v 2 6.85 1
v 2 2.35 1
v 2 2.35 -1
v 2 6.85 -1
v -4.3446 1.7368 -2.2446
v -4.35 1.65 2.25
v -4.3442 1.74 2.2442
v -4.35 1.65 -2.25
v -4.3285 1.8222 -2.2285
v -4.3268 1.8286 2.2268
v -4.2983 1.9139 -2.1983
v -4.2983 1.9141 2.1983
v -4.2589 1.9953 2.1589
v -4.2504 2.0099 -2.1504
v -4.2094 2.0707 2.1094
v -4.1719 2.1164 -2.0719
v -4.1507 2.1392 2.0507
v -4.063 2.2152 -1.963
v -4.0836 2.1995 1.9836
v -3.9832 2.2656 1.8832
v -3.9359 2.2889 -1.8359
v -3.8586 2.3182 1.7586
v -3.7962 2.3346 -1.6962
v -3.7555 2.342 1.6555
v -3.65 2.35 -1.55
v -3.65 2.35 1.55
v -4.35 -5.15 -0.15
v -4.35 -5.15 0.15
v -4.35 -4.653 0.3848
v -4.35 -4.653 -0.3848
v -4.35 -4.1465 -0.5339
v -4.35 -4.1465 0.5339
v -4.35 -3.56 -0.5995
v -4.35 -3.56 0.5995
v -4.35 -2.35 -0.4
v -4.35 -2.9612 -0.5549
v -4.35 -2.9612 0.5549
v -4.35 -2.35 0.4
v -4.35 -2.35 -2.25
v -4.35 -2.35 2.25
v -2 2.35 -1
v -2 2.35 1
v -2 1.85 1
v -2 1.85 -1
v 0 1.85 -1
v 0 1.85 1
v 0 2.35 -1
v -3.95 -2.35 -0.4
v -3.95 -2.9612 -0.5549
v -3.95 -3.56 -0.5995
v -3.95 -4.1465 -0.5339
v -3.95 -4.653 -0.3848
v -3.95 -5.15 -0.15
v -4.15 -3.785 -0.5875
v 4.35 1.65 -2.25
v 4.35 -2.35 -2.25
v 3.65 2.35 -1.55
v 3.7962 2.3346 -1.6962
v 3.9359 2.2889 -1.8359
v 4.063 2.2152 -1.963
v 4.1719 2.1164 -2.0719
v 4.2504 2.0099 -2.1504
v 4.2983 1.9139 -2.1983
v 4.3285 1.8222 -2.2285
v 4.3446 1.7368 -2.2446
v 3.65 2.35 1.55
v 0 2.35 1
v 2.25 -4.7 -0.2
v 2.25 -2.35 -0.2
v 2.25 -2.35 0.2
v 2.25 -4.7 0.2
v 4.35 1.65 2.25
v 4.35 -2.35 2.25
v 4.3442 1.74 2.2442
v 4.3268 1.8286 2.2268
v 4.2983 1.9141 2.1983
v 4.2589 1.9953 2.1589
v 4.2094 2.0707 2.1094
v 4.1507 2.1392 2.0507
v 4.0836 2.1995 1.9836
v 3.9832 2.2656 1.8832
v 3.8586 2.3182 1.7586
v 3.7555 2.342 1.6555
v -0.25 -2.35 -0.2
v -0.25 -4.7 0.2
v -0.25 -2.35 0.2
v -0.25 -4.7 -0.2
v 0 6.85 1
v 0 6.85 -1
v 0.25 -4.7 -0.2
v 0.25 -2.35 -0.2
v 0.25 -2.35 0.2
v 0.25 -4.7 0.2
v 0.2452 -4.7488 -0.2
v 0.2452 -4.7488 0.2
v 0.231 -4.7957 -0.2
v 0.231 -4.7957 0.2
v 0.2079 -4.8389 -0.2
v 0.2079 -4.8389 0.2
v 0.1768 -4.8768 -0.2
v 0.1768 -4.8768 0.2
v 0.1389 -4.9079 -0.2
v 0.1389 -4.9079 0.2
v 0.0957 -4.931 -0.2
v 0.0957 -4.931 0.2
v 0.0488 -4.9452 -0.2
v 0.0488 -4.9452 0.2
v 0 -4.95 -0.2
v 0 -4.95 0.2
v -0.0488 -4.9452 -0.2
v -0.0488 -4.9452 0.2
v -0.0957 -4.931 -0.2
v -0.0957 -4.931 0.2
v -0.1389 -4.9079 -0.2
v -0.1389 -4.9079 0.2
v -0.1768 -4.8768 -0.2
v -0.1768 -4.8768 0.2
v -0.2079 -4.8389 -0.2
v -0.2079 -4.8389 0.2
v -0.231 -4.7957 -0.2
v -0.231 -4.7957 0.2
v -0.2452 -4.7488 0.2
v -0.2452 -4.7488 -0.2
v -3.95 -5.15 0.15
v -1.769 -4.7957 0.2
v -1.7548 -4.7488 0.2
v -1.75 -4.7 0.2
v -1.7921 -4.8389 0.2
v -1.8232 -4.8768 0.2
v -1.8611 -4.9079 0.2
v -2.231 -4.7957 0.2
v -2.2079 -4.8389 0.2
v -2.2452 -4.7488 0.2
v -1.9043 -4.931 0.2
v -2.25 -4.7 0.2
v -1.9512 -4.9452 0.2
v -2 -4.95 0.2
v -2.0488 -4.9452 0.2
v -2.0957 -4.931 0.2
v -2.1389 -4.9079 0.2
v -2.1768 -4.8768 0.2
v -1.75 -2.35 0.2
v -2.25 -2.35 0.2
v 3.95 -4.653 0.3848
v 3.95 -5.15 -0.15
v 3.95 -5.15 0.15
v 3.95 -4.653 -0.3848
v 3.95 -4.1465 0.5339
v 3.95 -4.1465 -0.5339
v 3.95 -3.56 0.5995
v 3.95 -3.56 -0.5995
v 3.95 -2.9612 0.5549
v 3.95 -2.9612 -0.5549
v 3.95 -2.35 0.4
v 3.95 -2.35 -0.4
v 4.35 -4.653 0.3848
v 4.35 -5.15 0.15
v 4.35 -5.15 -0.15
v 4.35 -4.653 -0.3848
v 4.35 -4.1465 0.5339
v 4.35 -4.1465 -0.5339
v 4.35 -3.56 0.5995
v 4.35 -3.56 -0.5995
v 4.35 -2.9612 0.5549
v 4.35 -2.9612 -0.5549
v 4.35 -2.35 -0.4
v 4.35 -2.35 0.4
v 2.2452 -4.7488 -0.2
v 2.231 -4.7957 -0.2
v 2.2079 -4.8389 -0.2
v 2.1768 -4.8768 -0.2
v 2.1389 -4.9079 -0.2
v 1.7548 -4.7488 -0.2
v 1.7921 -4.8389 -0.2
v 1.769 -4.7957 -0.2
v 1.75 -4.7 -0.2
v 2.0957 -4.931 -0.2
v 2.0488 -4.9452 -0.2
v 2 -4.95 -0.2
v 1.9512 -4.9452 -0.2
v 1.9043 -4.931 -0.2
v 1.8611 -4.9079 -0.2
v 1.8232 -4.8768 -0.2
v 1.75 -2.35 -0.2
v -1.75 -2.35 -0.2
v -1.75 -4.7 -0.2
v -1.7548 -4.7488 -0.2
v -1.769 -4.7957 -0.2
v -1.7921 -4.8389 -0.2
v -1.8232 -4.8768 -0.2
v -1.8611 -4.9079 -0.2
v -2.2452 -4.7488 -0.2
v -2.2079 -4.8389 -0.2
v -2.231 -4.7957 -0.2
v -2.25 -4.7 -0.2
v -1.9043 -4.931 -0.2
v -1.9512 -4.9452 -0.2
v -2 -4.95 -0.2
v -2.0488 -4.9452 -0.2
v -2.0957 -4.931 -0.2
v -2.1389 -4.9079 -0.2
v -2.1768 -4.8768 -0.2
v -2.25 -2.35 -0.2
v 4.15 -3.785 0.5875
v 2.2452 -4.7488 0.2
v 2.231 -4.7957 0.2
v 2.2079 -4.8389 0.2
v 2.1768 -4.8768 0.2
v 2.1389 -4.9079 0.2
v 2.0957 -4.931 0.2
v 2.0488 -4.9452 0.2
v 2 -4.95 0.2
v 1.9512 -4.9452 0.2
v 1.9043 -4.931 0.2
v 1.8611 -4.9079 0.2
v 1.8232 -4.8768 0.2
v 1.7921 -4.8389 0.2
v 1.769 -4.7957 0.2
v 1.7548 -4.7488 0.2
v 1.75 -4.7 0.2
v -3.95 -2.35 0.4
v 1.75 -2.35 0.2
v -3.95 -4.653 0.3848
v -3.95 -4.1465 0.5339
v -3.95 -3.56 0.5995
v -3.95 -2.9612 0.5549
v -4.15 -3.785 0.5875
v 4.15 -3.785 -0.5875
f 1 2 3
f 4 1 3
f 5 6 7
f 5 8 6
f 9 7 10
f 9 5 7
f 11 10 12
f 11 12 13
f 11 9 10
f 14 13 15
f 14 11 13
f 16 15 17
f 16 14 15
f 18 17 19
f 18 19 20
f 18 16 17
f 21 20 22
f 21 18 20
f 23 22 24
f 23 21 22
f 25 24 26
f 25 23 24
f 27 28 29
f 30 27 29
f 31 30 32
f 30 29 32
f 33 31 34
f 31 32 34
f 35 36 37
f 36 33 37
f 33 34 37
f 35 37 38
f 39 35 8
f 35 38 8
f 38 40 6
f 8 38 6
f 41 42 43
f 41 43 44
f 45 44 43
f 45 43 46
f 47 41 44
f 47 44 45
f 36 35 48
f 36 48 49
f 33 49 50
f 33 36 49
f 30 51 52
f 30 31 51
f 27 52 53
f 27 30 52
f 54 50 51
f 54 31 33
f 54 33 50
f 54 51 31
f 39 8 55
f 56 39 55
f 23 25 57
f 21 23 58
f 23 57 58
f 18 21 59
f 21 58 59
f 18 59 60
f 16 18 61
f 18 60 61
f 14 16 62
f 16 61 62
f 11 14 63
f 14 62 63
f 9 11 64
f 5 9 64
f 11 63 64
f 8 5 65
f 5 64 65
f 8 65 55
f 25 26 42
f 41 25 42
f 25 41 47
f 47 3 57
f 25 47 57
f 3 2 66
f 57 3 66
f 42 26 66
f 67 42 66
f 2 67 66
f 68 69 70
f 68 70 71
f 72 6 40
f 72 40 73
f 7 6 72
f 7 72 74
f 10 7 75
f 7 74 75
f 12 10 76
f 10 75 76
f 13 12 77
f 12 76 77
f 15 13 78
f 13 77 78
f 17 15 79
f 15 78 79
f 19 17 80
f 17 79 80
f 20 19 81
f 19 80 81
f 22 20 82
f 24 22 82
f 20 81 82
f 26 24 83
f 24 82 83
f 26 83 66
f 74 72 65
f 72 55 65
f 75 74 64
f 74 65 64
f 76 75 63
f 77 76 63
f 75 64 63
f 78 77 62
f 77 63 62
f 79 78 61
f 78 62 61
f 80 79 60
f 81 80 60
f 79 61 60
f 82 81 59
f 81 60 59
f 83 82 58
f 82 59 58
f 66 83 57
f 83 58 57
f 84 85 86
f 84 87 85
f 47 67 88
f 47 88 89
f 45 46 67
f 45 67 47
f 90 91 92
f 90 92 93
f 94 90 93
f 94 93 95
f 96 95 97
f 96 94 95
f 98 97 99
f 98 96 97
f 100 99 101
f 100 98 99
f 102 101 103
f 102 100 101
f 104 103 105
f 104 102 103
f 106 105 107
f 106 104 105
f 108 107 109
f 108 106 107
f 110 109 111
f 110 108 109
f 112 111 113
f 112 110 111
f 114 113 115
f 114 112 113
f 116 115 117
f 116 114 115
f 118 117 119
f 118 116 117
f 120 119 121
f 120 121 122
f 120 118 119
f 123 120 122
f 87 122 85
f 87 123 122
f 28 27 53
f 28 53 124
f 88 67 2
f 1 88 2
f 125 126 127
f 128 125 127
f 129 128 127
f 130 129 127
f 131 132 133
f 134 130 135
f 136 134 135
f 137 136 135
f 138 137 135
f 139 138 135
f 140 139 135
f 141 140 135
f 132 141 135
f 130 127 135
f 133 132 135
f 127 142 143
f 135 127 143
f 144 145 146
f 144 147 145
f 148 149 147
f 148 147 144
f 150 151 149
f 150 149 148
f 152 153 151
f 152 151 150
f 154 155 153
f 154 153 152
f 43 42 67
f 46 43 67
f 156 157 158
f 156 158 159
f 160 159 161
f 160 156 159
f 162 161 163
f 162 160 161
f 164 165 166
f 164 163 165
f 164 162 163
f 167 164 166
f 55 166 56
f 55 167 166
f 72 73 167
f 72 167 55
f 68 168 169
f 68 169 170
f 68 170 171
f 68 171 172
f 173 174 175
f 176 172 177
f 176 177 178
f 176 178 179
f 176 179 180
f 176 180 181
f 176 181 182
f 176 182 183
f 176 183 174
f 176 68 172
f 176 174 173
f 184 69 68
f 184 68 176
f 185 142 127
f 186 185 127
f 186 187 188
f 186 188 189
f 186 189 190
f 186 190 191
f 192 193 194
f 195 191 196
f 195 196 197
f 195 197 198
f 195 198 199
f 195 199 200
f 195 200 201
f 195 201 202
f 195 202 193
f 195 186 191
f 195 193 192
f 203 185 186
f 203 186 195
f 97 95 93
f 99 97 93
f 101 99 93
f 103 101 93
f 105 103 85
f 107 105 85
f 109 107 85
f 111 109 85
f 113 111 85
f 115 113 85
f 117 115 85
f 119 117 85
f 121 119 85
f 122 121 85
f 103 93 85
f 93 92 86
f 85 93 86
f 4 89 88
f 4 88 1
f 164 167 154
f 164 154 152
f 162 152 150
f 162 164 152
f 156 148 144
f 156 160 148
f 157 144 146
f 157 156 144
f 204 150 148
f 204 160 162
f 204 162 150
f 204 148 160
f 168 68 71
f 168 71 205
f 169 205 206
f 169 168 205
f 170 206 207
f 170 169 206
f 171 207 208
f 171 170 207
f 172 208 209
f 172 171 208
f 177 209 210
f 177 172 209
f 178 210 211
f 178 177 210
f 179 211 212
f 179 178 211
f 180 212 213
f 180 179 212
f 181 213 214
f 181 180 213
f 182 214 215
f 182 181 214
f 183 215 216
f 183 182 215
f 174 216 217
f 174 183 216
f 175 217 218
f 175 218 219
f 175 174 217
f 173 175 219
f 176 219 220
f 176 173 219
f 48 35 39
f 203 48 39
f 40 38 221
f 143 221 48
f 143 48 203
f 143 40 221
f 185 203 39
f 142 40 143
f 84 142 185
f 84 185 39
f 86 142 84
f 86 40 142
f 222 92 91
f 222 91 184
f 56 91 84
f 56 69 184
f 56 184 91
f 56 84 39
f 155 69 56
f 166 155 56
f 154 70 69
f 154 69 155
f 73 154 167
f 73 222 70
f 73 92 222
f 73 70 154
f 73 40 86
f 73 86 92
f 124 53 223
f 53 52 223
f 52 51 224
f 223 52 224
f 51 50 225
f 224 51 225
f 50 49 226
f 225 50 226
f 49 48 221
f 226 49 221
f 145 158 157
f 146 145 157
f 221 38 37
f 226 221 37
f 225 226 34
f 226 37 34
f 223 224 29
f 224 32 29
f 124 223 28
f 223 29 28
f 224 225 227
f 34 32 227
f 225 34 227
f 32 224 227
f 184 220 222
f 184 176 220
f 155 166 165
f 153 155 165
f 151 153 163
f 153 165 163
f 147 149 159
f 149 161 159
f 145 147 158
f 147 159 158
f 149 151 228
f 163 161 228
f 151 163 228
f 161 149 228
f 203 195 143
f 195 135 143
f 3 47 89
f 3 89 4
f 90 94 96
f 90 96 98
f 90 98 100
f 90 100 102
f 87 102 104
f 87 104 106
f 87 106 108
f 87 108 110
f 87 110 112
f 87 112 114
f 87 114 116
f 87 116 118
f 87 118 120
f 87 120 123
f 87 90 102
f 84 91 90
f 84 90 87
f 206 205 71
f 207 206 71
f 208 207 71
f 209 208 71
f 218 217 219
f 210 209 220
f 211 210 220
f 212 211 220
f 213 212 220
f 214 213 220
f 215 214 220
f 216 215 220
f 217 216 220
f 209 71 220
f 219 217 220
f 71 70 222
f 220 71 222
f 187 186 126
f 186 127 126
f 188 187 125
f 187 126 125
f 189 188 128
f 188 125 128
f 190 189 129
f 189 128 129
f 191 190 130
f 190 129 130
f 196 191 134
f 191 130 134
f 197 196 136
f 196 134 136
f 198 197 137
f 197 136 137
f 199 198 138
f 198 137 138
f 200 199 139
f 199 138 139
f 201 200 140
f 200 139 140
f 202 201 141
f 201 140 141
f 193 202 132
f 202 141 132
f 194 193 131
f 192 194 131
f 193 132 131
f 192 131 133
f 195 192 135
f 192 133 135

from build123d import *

# Parameters (mm, degrees)
SKETCH1_W           = 8.7
SKETCH1_H           = 4.7
BOSS_EXTRUDE1_DEPTH = 2.25
FILLET1_R           = 0.7
BOSS_EXTRUDE2_DEPTH = 0.4
BOSS_EXTRUDE3_DEPTH = 0.2
SKETCH6_W           = 4
SKETCH6_H           = 2
CUT_EXTRUDE1_DEPTH  = 0.5
SKETCH7_W           = 2
SKETCH7_H           = 2
BOSS_EXTRUDE4_DEPTH = 5


with BuildPart() as part:
    # Sketch1 → Boss-Extrude1 (new, symmetric)
    with BuildSketch(Plane.XY):
        Rectangle(SKETCH1_W, SKETCH1_H)
    extrude(amount=BOSS_EXTRUDE1_DEPTH, both=True)

    # Fillet1
    fillet1_edges = [part.edges().sort_by_distance(p)[0] for p in [
        (0, 2.35, -2.25),
        (0, 2.35, 2.25),
        (-4.35, 2.35, 0),
        (4.35, 2.35, 0),
    ]]
    fillet(fillet1_edges, radius=FILLET1_R)

    # Sketch3 → Boss-Extrude2 (add)
    with BuildSketch(Plane.ZY.offset(4.35)):
        with BuildLine():
            Line((-0.15, -5.15), (0.15, -5.15))
            add(Edge.make_bspline(
                [(0.4, -2.35), (0.9, -3.820089362), (0.15, -5.15)],
                knots=[0, 0, 0, 1, 1, 1], degree=2))
            Line((0.4, -2.35), (-0.4, -2.35))
            add(Edge.make_bspline(
                [(-0.4, -2.35), (-0.9, -3.820089362), (-0.15, -5.15)],
                knots=[0, 0, 0, 1, 1, 1], degree=2))
        make_face()
    boss_extrude2 = extrude(amount=-BOSS_EXTRUDE2_DEPTH)

    # Mirror1: Boss-Extrude2 across plane
    add(boss_extrude2.mirror(Plane(origin=(0, 0, 0), x_dir=(0, 0, 1), z_dir=(1, 0, 0))))

    # Sketch5 → Boss-Extrude3 (add, symmetric)
    with BuildSketch(Plane.XY):
        with BuildLine():
            Line((-0.25, -2.35), (0.25, -2.35))
            Line((0.25, -2.35), (0.25, -4.7))
            ThreePointArc((0.25, -4.7), (0, -4.95), (-0.25, -4.7))
            Line((-0.25, -4.7), (-0.25, -2.35))
        make_face()
        with BuildLine():
            Line((1.75, -2.35), (2.25, -2.35))
            Line((2.25, -2.35), (2.25, -4.7))
            ThreePointArc((2.25, -4.7), (2, -4.95), (1.75, -4.7))
            Line((1.75, -4.7), (1.75, -2.35))
        make_face()
        with BuildLine():
            Line((-1.75, -2.35), (-1.75, -4.7))
            ThreePointArc((-1.75, -4.7), (-2, -4.95), (-2.25, -4.7))
            Line((-2.25, -4.7), (-2.25, -2.35))
            Line((-2.25, -2.35), (-1.75, -2.35))
        make_face()
    extrude(amount=BOSS_EXTRUDE3_DEPTH, both=True)

    # Sketch6 → Cut-Extrude1 (cut)
    with BuildSketch(Plane(origin=(0, 2.35, 0), x_dir=(1, 0, 0), z_dir=(0, 1, 0))):
        Rectangle(SKETCH6_W, SKETCH6_H)
    extrude(amount=-CUT_EXTRUDE1_DEPTH, mode=Mode.SUBTRACT)

    # Sketch7 → Boss-Extrude4 (add)
    with BuildSketch(Plane(origin=(0, 1.85, 0), x_dir=(1, 0, 0), z_dir=(0, 1, 0))):
        with Locations((1, 0)):
            Rectangle(SKETCH7_W, SKETCH7_H)
    extrude(amount=BOSS_EXTRUDE4_DEPTH)


solid = part.part
